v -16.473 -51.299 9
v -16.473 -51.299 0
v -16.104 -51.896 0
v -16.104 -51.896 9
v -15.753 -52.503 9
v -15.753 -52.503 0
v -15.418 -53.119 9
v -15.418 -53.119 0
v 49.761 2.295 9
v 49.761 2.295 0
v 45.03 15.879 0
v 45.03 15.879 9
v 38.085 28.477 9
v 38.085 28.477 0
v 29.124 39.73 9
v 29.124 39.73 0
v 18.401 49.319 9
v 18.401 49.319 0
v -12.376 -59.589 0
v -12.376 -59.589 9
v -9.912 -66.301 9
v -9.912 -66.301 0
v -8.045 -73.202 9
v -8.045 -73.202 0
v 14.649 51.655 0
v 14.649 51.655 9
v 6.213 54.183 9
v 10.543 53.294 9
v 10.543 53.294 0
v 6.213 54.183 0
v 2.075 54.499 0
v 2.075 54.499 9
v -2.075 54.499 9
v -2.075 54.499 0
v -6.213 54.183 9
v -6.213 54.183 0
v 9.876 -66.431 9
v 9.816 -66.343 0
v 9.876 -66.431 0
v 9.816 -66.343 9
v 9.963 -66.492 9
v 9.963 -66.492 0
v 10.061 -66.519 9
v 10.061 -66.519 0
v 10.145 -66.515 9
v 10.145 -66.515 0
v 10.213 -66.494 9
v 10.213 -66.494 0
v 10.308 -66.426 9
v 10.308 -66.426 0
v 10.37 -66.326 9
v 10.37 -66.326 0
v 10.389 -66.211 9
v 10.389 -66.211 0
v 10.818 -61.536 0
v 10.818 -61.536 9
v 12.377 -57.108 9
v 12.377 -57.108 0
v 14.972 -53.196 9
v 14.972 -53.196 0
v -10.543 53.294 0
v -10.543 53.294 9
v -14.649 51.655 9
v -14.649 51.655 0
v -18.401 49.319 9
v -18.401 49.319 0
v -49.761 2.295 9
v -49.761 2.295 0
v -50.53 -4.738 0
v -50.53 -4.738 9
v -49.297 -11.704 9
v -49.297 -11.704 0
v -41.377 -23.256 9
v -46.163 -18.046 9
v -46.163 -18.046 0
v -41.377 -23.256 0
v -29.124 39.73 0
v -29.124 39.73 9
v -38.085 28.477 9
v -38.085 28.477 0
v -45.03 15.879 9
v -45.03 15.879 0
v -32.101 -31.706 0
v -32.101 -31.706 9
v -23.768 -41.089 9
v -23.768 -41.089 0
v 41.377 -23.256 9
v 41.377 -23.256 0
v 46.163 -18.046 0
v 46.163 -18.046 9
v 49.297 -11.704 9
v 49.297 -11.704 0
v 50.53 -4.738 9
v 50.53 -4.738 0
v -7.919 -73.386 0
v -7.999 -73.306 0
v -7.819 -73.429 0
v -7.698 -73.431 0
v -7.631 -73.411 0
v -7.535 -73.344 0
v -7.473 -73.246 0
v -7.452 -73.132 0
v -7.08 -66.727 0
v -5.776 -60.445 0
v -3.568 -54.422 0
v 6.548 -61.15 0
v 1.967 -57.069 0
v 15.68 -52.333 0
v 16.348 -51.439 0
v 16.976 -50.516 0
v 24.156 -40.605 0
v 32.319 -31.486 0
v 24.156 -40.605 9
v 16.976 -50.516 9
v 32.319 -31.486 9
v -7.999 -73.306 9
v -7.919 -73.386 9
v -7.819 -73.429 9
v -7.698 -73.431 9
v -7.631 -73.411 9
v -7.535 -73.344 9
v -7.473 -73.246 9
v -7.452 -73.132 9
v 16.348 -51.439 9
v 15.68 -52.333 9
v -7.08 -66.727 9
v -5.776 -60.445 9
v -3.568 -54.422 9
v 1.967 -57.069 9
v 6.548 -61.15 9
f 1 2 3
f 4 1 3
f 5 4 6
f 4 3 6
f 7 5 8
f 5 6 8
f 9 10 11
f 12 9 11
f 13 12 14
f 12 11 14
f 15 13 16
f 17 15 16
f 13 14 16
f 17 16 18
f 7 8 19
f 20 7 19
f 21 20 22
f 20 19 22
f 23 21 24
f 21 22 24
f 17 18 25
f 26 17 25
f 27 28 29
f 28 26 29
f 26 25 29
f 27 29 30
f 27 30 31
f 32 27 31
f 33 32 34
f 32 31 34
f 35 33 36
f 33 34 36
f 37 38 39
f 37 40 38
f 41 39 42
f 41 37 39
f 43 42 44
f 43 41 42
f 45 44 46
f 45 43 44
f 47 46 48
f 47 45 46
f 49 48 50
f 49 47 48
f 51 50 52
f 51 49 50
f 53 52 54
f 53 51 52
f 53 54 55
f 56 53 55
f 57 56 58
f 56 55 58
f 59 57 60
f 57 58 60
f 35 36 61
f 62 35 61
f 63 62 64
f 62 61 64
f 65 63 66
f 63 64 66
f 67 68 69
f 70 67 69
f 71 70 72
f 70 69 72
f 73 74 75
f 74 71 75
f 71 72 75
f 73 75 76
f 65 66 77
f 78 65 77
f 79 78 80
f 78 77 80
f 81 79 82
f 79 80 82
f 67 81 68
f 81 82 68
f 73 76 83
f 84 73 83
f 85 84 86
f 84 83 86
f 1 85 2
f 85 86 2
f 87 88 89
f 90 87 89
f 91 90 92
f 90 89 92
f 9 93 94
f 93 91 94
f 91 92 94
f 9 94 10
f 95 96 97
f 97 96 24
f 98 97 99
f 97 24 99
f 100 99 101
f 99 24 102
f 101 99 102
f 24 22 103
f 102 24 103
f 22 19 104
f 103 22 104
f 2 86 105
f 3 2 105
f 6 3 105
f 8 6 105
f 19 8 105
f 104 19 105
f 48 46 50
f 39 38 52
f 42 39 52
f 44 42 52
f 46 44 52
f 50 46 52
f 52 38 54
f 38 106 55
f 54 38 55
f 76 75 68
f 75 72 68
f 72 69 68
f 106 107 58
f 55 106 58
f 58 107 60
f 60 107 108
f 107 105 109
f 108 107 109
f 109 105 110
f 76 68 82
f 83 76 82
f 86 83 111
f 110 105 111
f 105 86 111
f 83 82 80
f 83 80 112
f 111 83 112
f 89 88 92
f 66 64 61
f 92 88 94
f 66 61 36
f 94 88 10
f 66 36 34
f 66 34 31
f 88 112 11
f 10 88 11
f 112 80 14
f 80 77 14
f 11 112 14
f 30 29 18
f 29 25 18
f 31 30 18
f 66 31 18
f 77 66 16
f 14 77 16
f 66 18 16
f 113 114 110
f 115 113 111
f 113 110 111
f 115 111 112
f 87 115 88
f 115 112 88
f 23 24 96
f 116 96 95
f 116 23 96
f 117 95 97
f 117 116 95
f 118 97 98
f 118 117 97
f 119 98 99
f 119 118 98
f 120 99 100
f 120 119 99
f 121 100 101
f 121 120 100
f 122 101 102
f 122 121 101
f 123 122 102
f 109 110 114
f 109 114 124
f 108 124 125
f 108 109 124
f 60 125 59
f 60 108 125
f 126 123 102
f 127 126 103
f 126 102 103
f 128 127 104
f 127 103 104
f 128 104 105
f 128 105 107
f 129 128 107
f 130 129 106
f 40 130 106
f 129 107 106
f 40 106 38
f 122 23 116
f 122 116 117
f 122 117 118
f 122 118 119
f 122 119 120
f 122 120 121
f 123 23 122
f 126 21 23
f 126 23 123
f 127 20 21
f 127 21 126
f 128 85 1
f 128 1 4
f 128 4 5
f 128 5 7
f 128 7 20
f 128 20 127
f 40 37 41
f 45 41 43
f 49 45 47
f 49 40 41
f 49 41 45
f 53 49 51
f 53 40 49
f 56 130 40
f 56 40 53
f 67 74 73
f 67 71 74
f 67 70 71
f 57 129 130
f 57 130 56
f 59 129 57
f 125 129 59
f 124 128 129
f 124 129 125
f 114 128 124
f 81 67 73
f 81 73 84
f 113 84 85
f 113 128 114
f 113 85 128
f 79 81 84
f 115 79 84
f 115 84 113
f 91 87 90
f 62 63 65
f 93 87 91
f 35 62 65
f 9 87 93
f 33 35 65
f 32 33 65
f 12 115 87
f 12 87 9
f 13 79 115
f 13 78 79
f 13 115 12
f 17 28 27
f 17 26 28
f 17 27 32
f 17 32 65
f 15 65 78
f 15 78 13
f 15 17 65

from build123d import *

# Parameters (mm, degrees)
F1_DEPTH    = 9
F2_DEPTH    = 9
F3_T1_DEPTH = 9
F3_T3_DEPTH = 97.7984007527
F3_T5_DEPTH = 18.7464853336
F3_T7_DEPTH = 44.8077335821
F4_F1_R     = 0.3
F4_F2_R     = 0.3


# Not quite as in the source:
# - a fillet or chamfer that OpenCascade refuses, or shapes differently, is made with other operations: its cross-section is extruded or revolved along the edge and cut away or added


with BuildPart() as f1:
    # F0 (on Top) → F1 (new body)
    with BuildSketch(Plane.XY):
        with BuildLine():
            ThreePointArc((52.3559108968, -15.2742949835), (41.1175441228, 23.5793695766), (13.2592789192, 52.9021456617))
            ThreePointArc((13.2592789192, 52.9021456617), (0, 54.5384771796), (-13.2592789192, 52.9021456617))
            ThreePointArc((-13.2592789192, 52.9021456617), (-41.1175441228, 23.5793695766), (-52.3559108968, -15.2742949835))
            ThreePointArc((-52.3559108968, -15.2742949835), (-32.1035122758, -31.703635387), (-15.9292943442, -52.1603592277))
            ThreePointArc((-15.9292943442, -52.1603592277), (-9.8139264878, -53.648227743), (-3.5678639787, -54.4216486309))
            ThreePointArc((-3.5678639787, -54.4216486309), (6.2832792085, -54.1753255224), (15.9292943442, -52.1603592277))
            ThreePointArc((15.9292943442, -52.1603592277), (32.1035122758, -31.703635387), (52.3559108968, -15.2742949835))
        make_face()
    extrude(amount=F1_DEPTH)

    # F0 (on Top) → F2 (join)
    with BuildSketch(Plane.XY):
        with BuildLine():
            ThreePointArc((-7.0224064402, -78.6131843925), (-7.0174520358, -66.2714702986), (-3.5678639787, -54.4216486309))
            ThreePointArc((-3.5678639787, -54.4216486309), (-9.8139264878, -53.648227743), (-15.9292943442, -52.1603592277))
            ThreePointArc((-15.9292943442, -52.1603592277), (-10.336712225, -65.0032144434), (-7.0224064402, -78.6131843925))
        make_face()
        with BuildLine():
            ThreePointArc((10.5660464615, -68.2554319501), (11.3560818324, -59.5775748336), (15.9292943442, -52.1603592277))
            ThreePointArc((15.9292943442, -52.1603592277), (6.2832792085, -54.1753255224), (-3.5678639787, -54.4216486309))
            ThreePointArc((-3.5678639787, -54.4216486309), (5.1525036315, -59.6492567371), (10.5660464615, -68.2554319501))
        make_face()
    extrude(amount=F2_DEPTH)

    # F3: fillet of radius 25 on 6 edges, made by hand

    # F3_s2 → F3_t1 (join)
    with BuildSketch(Plane.XY):
        with BuildLine():
            ThreePointArc((-16.4732265546, -51.2989033705), (-15.9263980679, -52.1979676734), (-15.4178890795, -53.1192475566))
            ThreePointArc((-15.4178890795, -53.1192475566), (-15.6719958304, -52.6389522584), (-15.9292943442, -52.1603592277))
            ThreePointArc((-15.9292943442, -52.1603592277), (-16.2003358533, -51.7290474995), (-16.4732265546, -51.2989033705))
        make_face()
    extrude(amount=F3_T1_DEPTH)

    # F3_s4 → F3_t3 (cut)
    with BuildSketch(Plane.XY.offset(-44.3992003763)):
        with BuildLine():
            ThreePointArc((41.3774463504, -23.2564339871), (49.2973579438, -11.704046911), (49.7610601076, 2.2947968664))
            ThreePointArc((49.7610601076, 2.2947968664), (51.5165033775, -6.4221025316), (52.3559108968, -15.2742949835))
            ThreePointArc((52.3559108968, -15.2742949835), (46.752445175, -19.108250225), (41.3774463504, -23.2564339871))
        make_face()
        with BuildLine():
            ThreePointArc((-49.7610601076, 2.2947968664), (-49.2973579438, -11.704046911), (-41.3774463504, -23.2564339871))
            ThreePointArc((-41.3774463504, -23.2564339871), (-46.752445175, -19.108250225), (-52.3559108968, -15.2742949835))
            ThreePointArc((-52.3559108968, -15.2742949835), (-51.5165033775, -6.4221025316), (-49.7610601076, 2.2947968664))
        make_face()
    extrude(amount=F3_T3_DEPTH, mode=Mode.SUBTRACT)

    # F3_s6 → F3_t5 (cut)
    with BuildSketch(Plane.XY.offset(-4.8732426668)):
        with BuildLine():
            ThreePointArc((16.9764615861, -50.5162181687), (16.0190019724, -51.8895795654), (14.9717711174, -53.195779387))
            ThreePointArc((14.9717711174, -53.195779387), (15.4409431776, -52.6692011973), (15.9292943442, -52.1603592277))
            ThreePointArc((15.9292943442, -52.1603592277), (16.4495016002, -51.3361382631), (16.9764615861, -50.5162181687))
        make_face()
    extrude(amount=F3_T5_DEPTH, mode=Mode.SUBTRACT)

    # F3_s8 → F3_t7 (cut)
    with BuildSketch(Plane.XY.offset(-17.903866791)):
        with BuildLine():
            ThreePointArc((18.4012083068, 49.3190772564), (12.6321038646, 52.5652026084), (6.2132770502, 54.1833985771))
            ThreePointArc((6.2132770502, 54.1833985771), (9.7573311543, 53.6585499414), (13.2592789192, 52.9021456617))
            ThreePointArc((13.2592789192, 52.9021456617), (15.8631283238, 51.1578030954), (18.4012083068, 49.3190772564))
        make_face()
        with BuildLine():
            ThreePointArc((-6.2132770502, 54.1833985771), (-12.6321038646, 52.5652026084), (-18.4012083068, 49.3190772564))
            ThreePointArc((-18.4012083068, 49.3190772564), (-15.8631283238, 51.1578030954), (-13.2592789192, 52.9021456617))
            ThreePointArc((-13.2592789192, 52.9021456617), (-9.7573311543, 53.6585499414), (-6.2132770502, 54.1833985771))
        make_face()
    extrude(amount=F3_T7_DEPTH, mode=Mode.SUBTRACT)

    # F4: fillet of radius 0.3 on 2 edges, made by hand

    # F4_f1
    f4_f1_edges = [f1.edges().sort_by_distance(p)[0] for p in [
        (-7.0224064402, -78.6131843925, 4.5),
    ]]
    fillet(f4_f1_edges, radius=F4_F1_R)

    # F4_f2
    f4_f2_edges = [f1.edges().sort_by_distance(p)[0] for p in [
        (10.5660464615, -68.2554319501, 4.5),
    ]]
    fillet(f4_f2_edges, radius=F4_F2_R)


solid = f1.part
